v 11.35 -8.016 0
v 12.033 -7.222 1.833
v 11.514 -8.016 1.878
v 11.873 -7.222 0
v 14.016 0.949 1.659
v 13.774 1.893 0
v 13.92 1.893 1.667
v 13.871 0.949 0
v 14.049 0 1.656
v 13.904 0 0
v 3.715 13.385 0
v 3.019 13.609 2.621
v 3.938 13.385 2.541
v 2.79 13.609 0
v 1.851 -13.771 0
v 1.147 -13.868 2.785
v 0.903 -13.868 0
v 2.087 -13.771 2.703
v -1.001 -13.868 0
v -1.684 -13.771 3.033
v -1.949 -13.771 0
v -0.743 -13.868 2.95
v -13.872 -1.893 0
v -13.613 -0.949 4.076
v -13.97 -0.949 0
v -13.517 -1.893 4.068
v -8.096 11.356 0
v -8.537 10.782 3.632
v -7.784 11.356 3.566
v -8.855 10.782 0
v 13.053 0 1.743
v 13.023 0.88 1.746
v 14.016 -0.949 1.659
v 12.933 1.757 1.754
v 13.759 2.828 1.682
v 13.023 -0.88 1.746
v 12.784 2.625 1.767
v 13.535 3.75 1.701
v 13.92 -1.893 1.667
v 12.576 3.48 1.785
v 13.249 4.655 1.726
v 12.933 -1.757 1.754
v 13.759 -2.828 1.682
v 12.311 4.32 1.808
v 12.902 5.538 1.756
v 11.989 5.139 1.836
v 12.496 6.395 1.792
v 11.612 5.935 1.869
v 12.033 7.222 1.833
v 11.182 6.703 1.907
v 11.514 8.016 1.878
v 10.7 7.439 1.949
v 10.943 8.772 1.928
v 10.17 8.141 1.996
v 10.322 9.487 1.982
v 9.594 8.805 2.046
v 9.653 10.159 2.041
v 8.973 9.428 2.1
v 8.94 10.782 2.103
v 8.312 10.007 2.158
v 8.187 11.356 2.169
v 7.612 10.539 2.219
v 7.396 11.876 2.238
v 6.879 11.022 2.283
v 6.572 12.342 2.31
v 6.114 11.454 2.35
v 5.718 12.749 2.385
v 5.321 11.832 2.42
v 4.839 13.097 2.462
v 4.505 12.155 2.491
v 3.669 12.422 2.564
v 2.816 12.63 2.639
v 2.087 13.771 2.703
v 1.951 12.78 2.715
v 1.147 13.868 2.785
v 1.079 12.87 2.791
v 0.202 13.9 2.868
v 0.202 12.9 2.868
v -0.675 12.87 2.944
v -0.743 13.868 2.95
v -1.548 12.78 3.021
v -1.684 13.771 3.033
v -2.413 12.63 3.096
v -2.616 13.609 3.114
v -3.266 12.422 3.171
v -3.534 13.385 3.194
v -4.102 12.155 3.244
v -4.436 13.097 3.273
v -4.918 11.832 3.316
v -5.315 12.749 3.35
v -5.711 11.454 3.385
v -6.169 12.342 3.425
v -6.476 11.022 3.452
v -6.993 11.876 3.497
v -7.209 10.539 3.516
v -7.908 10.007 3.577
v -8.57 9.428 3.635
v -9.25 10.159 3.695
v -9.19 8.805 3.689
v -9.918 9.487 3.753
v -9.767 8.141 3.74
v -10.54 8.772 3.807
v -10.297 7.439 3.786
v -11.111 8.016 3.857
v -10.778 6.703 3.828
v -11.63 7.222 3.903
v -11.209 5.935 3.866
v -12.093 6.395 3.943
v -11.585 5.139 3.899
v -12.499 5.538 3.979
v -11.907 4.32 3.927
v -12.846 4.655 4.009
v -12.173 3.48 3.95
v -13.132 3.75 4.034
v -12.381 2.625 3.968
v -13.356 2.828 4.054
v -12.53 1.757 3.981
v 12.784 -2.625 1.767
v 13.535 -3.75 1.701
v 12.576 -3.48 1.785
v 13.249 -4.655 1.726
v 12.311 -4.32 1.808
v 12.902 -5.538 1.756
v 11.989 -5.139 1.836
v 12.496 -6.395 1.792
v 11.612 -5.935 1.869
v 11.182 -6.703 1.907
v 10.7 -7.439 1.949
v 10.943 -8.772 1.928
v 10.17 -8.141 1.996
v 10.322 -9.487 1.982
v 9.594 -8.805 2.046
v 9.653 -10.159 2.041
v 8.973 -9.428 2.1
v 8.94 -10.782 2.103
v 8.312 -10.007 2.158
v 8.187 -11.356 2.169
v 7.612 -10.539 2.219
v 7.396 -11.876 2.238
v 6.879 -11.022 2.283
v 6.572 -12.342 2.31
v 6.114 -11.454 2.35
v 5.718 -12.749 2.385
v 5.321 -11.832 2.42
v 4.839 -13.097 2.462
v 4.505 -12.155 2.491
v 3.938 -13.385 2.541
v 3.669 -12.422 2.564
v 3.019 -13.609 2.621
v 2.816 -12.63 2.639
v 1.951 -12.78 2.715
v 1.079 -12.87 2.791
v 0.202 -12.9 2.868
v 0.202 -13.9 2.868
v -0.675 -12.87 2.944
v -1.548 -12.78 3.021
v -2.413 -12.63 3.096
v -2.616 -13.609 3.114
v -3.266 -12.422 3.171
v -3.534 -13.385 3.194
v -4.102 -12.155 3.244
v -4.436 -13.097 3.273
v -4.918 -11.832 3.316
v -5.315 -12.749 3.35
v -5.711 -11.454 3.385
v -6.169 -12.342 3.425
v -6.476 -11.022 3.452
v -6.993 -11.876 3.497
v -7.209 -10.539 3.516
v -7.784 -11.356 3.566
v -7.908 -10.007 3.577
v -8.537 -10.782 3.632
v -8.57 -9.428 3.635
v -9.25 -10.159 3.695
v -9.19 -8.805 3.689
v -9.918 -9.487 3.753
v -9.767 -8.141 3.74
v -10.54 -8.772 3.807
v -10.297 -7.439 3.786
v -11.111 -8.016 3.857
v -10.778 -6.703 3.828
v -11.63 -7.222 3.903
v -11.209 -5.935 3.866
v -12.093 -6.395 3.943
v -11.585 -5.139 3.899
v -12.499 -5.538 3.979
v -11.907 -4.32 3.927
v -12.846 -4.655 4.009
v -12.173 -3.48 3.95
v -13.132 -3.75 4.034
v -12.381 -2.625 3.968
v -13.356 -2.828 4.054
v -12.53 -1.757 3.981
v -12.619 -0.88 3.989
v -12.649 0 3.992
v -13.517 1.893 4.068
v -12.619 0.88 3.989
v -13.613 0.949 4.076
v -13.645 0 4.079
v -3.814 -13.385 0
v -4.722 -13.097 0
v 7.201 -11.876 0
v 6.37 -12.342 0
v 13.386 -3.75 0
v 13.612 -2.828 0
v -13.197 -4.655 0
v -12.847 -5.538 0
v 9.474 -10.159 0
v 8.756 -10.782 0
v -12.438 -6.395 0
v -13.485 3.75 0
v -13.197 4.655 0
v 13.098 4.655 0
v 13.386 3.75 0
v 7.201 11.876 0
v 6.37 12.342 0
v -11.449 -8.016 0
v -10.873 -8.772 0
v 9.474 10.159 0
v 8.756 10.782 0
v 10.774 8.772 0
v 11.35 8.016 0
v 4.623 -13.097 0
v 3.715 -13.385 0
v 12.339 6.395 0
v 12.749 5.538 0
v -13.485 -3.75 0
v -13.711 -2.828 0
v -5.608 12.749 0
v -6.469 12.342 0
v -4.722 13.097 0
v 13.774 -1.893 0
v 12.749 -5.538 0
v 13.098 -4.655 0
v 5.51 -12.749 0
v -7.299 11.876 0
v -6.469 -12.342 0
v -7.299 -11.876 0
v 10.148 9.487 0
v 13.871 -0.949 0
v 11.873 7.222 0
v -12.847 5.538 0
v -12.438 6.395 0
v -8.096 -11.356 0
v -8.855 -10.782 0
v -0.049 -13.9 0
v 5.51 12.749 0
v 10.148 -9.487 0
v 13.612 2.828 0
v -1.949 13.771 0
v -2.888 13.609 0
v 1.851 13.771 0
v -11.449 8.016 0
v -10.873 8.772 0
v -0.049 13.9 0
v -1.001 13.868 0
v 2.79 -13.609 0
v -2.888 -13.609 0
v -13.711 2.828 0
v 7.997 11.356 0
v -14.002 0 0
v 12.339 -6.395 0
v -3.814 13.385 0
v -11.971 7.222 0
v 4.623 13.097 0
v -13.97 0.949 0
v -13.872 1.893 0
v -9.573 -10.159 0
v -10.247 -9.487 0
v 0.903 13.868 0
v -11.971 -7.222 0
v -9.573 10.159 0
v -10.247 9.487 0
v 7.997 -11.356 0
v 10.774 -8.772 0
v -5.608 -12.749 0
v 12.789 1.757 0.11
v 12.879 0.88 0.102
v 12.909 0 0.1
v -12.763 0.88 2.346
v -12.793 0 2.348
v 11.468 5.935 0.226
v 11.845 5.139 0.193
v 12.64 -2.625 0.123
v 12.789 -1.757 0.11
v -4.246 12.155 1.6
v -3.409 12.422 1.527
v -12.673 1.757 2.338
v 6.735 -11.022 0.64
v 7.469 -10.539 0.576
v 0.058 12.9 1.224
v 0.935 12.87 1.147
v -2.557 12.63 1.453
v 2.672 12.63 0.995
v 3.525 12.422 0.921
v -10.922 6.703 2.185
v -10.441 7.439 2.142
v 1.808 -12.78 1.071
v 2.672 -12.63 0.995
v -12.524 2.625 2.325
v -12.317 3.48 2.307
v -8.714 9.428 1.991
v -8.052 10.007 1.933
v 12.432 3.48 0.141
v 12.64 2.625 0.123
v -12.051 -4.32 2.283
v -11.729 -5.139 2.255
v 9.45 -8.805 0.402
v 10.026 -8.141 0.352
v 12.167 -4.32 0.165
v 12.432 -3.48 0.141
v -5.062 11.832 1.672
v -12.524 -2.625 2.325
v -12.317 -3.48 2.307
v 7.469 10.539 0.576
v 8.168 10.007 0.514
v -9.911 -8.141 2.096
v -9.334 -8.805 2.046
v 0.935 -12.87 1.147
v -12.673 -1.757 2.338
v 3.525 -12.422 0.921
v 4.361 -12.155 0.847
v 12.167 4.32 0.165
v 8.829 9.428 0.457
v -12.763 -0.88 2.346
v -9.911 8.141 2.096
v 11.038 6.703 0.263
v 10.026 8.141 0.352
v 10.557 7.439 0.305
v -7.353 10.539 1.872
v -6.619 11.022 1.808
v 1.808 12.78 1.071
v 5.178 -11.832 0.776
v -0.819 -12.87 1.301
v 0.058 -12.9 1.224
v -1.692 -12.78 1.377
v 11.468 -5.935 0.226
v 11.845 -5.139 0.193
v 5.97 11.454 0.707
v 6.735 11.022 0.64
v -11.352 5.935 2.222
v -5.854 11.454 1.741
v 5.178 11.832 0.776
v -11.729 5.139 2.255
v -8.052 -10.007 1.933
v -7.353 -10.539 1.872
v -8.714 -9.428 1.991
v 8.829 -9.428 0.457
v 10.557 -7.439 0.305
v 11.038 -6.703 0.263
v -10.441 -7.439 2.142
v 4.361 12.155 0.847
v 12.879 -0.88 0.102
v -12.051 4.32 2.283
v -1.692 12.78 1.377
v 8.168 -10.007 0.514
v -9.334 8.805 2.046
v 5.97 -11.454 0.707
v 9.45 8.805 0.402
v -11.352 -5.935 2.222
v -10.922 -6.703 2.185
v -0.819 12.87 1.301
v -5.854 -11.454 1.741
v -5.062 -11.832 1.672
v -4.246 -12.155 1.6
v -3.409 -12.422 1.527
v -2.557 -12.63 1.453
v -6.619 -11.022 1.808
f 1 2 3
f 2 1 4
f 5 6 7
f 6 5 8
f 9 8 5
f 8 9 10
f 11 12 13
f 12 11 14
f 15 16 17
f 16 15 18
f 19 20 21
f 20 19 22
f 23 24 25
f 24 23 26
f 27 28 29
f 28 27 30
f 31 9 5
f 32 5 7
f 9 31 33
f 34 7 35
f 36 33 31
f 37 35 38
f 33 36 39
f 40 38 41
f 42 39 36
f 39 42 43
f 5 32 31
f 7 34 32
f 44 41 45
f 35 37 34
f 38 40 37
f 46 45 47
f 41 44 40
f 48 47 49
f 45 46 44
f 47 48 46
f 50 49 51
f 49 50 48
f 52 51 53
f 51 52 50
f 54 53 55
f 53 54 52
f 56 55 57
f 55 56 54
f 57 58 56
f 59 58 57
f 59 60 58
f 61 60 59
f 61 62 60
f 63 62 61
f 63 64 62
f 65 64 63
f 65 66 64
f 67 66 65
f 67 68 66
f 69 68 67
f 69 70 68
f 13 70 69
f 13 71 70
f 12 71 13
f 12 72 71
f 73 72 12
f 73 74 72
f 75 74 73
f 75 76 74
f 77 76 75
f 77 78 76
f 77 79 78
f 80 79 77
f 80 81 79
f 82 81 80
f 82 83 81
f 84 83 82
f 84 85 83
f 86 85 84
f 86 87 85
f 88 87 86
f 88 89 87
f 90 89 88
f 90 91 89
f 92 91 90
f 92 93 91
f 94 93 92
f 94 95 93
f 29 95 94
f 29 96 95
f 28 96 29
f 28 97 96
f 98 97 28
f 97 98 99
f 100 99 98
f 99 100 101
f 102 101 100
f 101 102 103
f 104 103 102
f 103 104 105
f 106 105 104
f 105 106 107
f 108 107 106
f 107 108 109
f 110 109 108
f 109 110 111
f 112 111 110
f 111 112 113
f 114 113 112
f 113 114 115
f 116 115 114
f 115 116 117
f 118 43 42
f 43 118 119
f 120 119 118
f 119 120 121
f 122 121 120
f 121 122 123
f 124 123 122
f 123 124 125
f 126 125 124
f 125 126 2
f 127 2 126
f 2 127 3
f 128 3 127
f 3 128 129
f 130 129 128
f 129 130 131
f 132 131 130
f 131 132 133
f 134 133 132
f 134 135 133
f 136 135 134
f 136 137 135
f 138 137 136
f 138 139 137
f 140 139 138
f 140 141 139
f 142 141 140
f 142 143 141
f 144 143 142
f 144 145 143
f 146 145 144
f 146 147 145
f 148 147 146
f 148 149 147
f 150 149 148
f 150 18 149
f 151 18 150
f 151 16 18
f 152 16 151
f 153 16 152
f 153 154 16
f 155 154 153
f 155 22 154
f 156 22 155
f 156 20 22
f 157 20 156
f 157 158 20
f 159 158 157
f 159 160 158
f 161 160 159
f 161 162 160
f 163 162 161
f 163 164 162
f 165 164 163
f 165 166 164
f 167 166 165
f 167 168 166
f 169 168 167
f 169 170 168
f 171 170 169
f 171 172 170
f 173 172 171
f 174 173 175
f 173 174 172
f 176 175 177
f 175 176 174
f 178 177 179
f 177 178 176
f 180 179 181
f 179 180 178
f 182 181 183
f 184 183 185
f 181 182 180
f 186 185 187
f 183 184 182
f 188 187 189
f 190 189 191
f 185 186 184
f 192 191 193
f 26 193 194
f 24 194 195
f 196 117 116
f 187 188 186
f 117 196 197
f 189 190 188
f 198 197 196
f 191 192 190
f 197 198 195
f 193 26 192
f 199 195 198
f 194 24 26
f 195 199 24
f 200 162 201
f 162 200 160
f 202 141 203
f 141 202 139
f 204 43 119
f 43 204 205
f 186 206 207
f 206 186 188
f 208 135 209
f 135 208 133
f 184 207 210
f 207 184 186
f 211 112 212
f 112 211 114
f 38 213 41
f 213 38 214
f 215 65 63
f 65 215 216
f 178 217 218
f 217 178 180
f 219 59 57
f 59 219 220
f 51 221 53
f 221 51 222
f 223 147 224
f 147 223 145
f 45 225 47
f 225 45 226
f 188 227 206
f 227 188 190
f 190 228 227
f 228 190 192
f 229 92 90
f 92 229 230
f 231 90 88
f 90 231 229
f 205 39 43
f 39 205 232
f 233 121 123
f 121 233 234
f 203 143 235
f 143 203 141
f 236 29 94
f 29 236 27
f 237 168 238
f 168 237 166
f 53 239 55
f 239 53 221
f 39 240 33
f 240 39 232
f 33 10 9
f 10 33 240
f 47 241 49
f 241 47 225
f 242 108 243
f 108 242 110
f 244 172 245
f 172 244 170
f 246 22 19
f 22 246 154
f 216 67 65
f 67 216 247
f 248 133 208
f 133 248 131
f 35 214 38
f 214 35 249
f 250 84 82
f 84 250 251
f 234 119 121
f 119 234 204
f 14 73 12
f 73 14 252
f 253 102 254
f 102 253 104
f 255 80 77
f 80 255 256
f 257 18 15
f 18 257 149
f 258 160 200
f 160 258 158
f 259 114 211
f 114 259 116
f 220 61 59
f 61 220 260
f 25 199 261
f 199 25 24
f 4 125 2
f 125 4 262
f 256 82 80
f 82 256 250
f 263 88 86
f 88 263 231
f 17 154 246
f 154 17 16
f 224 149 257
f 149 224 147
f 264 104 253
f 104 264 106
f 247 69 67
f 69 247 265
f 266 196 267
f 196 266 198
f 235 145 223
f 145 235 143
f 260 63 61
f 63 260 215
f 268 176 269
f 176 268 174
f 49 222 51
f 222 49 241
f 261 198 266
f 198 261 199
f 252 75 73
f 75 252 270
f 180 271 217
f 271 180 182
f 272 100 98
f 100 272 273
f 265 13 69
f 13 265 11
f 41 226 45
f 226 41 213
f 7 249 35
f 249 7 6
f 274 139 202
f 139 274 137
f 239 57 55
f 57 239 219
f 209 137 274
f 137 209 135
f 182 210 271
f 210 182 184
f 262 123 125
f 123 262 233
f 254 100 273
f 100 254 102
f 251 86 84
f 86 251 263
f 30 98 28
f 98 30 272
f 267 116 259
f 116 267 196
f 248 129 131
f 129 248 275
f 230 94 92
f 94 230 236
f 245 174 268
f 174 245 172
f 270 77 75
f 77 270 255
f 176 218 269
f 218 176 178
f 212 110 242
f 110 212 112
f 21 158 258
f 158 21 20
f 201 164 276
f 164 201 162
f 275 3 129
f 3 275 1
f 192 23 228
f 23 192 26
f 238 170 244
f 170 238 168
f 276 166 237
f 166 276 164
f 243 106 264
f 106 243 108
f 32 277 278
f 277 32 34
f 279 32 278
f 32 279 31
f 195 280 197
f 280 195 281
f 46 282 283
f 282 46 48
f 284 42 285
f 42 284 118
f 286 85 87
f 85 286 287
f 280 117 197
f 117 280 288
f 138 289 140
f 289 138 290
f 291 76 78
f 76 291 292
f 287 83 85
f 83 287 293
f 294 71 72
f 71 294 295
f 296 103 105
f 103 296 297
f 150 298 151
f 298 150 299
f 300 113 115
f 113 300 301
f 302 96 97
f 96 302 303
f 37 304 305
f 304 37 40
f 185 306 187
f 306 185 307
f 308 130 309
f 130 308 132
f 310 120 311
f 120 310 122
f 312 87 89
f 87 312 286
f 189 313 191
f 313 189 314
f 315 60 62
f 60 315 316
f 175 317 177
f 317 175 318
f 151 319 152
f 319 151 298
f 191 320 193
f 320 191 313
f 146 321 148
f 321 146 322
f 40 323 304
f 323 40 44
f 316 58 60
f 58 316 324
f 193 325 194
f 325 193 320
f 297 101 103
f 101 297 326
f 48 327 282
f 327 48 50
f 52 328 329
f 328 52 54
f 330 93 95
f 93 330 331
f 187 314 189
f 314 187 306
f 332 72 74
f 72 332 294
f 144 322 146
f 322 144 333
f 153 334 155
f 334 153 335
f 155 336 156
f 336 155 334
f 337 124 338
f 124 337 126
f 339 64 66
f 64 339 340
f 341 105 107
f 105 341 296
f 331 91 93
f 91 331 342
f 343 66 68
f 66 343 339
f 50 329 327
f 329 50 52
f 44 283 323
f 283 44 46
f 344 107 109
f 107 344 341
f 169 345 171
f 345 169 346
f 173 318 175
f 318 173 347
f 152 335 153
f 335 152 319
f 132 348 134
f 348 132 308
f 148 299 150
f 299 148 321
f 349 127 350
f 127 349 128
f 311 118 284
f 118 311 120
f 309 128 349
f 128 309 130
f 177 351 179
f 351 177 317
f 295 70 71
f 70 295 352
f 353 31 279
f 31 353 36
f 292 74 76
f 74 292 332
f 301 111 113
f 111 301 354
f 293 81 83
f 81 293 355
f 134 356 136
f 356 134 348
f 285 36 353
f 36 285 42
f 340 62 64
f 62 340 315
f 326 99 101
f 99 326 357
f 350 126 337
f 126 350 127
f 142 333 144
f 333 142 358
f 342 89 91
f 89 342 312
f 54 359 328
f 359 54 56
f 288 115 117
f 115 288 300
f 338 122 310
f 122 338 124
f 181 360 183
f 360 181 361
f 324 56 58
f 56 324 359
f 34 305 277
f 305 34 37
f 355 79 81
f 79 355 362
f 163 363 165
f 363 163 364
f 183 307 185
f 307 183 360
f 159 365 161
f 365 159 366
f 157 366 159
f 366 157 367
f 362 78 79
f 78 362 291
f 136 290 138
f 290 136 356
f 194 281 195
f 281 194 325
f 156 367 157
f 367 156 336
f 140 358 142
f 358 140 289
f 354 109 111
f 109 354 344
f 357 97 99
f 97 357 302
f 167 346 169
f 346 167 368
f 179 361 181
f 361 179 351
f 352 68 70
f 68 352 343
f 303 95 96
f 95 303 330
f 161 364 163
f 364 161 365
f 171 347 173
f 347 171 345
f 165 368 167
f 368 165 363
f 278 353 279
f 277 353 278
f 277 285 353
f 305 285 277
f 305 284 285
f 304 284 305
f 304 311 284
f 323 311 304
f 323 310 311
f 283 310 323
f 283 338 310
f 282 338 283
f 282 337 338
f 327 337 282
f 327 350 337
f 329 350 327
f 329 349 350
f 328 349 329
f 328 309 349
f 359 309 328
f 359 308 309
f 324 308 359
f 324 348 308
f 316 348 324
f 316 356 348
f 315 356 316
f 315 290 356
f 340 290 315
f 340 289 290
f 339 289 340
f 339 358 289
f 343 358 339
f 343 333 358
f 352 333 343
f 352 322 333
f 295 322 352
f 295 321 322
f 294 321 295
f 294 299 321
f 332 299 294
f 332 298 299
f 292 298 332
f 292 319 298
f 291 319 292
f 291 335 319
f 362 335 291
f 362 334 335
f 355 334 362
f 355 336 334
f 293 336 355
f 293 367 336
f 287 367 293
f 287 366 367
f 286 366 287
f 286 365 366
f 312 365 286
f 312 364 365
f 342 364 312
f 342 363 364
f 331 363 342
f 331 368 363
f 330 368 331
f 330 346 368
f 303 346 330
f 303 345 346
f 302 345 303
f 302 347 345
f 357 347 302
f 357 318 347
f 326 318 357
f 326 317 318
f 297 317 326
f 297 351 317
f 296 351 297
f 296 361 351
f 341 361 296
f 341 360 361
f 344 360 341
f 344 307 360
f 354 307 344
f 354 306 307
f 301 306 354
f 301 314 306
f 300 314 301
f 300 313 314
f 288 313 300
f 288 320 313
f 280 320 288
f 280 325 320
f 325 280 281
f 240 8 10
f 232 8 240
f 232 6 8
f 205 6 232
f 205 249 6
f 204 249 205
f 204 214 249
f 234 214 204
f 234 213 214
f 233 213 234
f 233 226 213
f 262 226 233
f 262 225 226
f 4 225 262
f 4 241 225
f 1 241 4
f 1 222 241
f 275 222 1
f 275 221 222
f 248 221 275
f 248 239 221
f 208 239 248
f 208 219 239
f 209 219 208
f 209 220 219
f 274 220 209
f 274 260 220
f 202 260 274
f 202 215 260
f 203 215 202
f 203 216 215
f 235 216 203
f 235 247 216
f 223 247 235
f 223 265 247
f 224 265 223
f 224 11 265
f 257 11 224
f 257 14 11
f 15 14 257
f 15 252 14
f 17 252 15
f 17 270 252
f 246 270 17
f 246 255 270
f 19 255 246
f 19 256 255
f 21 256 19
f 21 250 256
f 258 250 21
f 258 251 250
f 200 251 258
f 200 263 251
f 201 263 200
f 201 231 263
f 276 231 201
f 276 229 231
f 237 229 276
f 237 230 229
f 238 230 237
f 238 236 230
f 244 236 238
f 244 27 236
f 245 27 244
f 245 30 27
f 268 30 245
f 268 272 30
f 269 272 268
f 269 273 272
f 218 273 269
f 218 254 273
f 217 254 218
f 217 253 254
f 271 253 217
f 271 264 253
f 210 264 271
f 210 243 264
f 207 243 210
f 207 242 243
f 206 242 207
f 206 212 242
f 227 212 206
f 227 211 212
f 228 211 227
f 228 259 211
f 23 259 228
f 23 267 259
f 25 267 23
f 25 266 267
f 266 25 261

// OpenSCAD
// Laser Tunnel -- Angled Mirror Holder
// Adrian McCarthy 2022

// A larger angle makes a wider cone of light. (degrees)
Angle = 5; // [3:1:20]

// The mirror should not be wider than the hub of the fan. (mm)
Mirror_Diameter = 25.4; // [20:0.2:27]

// The mirror should be thin and light. (mm)
Mirror_Thickness = 1.75; // [1:0.25:2]

// Some dimensions may be optimized for your printer's nozzle size, but the default value should work for most. (mm)
Nozzle_Diameter = 0.4;  // [0.1:0.1:0.8]

module angled_mirror_holder(angle=5, mirror_d=25.4, mirror_th=1.75, nozzle_d=0.4) {
    h = mirror_d;
    inner_d = mirror_d + nozzle_d;
    outer_d = inner_d + 2;
    box = sqrt(2)*outer_d;
    intersection() {
        r = inner_d/2;
        translate([r, 0, 0]) rotate([0, angle, 0]) translate([-r, 0, 0])
        difference() {
            translate([0, 0, mirror_th-h]) cylinder(d=outer_d, h=h);
            translate([0, 0, 0.1]) cylinder(d=inner_d, h=h);
        }

        translate([-box/2, -box/2, 0]) cube(box);
    }
}

angled_mirror_holder(Angle, Mirror_Diameter, Mirror_Thickness, Nozzle_Diameter, $fn=92);
